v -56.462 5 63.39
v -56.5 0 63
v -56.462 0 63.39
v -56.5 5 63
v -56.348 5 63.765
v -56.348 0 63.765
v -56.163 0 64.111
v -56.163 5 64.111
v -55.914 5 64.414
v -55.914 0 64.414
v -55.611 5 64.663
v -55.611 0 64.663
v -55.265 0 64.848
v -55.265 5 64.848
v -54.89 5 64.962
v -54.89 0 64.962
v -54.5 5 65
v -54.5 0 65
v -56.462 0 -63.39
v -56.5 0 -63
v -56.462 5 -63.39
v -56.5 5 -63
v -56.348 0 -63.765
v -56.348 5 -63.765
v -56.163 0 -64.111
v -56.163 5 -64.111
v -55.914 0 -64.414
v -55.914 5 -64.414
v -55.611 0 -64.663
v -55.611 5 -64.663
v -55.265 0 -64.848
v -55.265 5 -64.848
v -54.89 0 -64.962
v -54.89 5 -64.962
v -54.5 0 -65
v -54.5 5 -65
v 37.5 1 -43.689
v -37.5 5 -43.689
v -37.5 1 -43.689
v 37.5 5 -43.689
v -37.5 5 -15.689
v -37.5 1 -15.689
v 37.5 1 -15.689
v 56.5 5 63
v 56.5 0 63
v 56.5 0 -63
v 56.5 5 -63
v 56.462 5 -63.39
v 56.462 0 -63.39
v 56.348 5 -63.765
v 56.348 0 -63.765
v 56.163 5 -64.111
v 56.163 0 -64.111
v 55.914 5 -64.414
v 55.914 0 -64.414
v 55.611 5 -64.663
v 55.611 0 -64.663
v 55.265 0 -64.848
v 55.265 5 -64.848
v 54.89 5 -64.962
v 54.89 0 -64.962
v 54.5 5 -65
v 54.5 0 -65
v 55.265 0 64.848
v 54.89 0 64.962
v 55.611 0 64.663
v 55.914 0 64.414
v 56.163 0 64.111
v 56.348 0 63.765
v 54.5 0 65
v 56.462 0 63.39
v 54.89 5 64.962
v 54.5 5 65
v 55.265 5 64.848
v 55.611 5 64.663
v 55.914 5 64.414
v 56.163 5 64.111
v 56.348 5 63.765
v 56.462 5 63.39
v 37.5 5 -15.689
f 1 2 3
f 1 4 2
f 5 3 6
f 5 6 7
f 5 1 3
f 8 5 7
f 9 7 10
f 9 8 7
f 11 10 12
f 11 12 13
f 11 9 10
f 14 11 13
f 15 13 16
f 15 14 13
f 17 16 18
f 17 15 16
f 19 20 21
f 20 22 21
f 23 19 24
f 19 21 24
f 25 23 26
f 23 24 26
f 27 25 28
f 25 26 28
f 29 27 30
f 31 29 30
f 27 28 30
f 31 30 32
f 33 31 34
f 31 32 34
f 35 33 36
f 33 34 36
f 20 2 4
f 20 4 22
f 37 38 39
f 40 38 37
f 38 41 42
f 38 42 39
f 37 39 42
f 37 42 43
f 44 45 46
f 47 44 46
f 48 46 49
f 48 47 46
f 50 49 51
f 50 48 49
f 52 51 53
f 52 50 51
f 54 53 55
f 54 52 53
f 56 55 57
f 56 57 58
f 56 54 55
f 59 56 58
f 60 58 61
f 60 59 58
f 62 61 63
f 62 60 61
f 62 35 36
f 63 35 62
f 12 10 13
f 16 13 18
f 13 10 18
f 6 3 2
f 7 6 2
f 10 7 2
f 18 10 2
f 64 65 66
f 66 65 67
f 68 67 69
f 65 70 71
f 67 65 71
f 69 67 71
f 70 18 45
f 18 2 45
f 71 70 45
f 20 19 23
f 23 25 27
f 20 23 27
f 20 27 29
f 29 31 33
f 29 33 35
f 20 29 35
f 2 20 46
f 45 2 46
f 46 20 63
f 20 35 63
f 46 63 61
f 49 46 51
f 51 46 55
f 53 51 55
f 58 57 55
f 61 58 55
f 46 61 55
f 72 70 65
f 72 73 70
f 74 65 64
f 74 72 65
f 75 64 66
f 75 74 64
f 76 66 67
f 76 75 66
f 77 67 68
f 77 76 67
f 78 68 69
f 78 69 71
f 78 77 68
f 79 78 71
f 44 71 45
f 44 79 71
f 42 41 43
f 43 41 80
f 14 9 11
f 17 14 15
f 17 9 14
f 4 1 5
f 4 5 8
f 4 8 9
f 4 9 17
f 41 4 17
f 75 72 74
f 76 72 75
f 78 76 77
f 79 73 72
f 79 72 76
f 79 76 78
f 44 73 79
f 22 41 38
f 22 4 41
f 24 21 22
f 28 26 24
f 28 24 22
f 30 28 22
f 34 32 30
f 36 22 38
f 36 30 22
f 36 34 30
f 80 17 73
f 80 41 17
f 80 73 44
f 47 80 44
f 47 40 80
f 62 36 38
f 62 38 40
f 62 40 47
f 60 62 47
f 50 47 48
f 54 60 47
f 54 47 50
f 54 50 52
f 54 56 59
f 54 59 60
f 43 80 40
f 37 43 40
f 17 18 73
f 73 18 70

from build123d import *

# Parameters (mm, degrees)
SKETCH1_W           = 113
SKETCH1_H           = 130
BOSS_EXTRUDE1_DEPTH = 5
FILLET1_R           = 2
SKETCH3_W           = 75
SKETCH3_H           = 28
CUT_EXTRUDE1_DEPTH  = 4


with BuildPart() as part:
    # Sketch1 → Boss-Extrude1 (new body)
    with BuildSketch(Plane(origin=(0, 0, 0), x_dir=(1, 0, 0), z_dir=(0, 1, 0))):
        Rectangle(SKETCH1_W, SKETCH1_H)
    extrude(amount=BOSS_EXTRUDE1_DEPTH)

    # Fillet1
    fillet1_edges = [part.edges().sort_by_distance(p)[0] for p in [
        (56.5, 2.5, 65),
        (-56.5, 2.5, 65),
        (-56.5, 2.5, -65),
        (56.5, 2.5, -65),
    ]]
    fillet(fillet1_edges, radius=FILLET1_R)

    # Sketch3 → Cut-Extrude1 (cut)
    with BuildSketch(Plane(origin=(0, 5, 0), x_dir=(1, 0, 0), z_dir=(0, 1, 0))):
        with Locations((0, 29.689320388)):
            Rectangle(SKETCH3_W, SKETCH3_H)
    extrude(amount=-CUT_EXTRUDE1_DEPTH, mode=Mode.SUBTRACT)


solid = part.part
